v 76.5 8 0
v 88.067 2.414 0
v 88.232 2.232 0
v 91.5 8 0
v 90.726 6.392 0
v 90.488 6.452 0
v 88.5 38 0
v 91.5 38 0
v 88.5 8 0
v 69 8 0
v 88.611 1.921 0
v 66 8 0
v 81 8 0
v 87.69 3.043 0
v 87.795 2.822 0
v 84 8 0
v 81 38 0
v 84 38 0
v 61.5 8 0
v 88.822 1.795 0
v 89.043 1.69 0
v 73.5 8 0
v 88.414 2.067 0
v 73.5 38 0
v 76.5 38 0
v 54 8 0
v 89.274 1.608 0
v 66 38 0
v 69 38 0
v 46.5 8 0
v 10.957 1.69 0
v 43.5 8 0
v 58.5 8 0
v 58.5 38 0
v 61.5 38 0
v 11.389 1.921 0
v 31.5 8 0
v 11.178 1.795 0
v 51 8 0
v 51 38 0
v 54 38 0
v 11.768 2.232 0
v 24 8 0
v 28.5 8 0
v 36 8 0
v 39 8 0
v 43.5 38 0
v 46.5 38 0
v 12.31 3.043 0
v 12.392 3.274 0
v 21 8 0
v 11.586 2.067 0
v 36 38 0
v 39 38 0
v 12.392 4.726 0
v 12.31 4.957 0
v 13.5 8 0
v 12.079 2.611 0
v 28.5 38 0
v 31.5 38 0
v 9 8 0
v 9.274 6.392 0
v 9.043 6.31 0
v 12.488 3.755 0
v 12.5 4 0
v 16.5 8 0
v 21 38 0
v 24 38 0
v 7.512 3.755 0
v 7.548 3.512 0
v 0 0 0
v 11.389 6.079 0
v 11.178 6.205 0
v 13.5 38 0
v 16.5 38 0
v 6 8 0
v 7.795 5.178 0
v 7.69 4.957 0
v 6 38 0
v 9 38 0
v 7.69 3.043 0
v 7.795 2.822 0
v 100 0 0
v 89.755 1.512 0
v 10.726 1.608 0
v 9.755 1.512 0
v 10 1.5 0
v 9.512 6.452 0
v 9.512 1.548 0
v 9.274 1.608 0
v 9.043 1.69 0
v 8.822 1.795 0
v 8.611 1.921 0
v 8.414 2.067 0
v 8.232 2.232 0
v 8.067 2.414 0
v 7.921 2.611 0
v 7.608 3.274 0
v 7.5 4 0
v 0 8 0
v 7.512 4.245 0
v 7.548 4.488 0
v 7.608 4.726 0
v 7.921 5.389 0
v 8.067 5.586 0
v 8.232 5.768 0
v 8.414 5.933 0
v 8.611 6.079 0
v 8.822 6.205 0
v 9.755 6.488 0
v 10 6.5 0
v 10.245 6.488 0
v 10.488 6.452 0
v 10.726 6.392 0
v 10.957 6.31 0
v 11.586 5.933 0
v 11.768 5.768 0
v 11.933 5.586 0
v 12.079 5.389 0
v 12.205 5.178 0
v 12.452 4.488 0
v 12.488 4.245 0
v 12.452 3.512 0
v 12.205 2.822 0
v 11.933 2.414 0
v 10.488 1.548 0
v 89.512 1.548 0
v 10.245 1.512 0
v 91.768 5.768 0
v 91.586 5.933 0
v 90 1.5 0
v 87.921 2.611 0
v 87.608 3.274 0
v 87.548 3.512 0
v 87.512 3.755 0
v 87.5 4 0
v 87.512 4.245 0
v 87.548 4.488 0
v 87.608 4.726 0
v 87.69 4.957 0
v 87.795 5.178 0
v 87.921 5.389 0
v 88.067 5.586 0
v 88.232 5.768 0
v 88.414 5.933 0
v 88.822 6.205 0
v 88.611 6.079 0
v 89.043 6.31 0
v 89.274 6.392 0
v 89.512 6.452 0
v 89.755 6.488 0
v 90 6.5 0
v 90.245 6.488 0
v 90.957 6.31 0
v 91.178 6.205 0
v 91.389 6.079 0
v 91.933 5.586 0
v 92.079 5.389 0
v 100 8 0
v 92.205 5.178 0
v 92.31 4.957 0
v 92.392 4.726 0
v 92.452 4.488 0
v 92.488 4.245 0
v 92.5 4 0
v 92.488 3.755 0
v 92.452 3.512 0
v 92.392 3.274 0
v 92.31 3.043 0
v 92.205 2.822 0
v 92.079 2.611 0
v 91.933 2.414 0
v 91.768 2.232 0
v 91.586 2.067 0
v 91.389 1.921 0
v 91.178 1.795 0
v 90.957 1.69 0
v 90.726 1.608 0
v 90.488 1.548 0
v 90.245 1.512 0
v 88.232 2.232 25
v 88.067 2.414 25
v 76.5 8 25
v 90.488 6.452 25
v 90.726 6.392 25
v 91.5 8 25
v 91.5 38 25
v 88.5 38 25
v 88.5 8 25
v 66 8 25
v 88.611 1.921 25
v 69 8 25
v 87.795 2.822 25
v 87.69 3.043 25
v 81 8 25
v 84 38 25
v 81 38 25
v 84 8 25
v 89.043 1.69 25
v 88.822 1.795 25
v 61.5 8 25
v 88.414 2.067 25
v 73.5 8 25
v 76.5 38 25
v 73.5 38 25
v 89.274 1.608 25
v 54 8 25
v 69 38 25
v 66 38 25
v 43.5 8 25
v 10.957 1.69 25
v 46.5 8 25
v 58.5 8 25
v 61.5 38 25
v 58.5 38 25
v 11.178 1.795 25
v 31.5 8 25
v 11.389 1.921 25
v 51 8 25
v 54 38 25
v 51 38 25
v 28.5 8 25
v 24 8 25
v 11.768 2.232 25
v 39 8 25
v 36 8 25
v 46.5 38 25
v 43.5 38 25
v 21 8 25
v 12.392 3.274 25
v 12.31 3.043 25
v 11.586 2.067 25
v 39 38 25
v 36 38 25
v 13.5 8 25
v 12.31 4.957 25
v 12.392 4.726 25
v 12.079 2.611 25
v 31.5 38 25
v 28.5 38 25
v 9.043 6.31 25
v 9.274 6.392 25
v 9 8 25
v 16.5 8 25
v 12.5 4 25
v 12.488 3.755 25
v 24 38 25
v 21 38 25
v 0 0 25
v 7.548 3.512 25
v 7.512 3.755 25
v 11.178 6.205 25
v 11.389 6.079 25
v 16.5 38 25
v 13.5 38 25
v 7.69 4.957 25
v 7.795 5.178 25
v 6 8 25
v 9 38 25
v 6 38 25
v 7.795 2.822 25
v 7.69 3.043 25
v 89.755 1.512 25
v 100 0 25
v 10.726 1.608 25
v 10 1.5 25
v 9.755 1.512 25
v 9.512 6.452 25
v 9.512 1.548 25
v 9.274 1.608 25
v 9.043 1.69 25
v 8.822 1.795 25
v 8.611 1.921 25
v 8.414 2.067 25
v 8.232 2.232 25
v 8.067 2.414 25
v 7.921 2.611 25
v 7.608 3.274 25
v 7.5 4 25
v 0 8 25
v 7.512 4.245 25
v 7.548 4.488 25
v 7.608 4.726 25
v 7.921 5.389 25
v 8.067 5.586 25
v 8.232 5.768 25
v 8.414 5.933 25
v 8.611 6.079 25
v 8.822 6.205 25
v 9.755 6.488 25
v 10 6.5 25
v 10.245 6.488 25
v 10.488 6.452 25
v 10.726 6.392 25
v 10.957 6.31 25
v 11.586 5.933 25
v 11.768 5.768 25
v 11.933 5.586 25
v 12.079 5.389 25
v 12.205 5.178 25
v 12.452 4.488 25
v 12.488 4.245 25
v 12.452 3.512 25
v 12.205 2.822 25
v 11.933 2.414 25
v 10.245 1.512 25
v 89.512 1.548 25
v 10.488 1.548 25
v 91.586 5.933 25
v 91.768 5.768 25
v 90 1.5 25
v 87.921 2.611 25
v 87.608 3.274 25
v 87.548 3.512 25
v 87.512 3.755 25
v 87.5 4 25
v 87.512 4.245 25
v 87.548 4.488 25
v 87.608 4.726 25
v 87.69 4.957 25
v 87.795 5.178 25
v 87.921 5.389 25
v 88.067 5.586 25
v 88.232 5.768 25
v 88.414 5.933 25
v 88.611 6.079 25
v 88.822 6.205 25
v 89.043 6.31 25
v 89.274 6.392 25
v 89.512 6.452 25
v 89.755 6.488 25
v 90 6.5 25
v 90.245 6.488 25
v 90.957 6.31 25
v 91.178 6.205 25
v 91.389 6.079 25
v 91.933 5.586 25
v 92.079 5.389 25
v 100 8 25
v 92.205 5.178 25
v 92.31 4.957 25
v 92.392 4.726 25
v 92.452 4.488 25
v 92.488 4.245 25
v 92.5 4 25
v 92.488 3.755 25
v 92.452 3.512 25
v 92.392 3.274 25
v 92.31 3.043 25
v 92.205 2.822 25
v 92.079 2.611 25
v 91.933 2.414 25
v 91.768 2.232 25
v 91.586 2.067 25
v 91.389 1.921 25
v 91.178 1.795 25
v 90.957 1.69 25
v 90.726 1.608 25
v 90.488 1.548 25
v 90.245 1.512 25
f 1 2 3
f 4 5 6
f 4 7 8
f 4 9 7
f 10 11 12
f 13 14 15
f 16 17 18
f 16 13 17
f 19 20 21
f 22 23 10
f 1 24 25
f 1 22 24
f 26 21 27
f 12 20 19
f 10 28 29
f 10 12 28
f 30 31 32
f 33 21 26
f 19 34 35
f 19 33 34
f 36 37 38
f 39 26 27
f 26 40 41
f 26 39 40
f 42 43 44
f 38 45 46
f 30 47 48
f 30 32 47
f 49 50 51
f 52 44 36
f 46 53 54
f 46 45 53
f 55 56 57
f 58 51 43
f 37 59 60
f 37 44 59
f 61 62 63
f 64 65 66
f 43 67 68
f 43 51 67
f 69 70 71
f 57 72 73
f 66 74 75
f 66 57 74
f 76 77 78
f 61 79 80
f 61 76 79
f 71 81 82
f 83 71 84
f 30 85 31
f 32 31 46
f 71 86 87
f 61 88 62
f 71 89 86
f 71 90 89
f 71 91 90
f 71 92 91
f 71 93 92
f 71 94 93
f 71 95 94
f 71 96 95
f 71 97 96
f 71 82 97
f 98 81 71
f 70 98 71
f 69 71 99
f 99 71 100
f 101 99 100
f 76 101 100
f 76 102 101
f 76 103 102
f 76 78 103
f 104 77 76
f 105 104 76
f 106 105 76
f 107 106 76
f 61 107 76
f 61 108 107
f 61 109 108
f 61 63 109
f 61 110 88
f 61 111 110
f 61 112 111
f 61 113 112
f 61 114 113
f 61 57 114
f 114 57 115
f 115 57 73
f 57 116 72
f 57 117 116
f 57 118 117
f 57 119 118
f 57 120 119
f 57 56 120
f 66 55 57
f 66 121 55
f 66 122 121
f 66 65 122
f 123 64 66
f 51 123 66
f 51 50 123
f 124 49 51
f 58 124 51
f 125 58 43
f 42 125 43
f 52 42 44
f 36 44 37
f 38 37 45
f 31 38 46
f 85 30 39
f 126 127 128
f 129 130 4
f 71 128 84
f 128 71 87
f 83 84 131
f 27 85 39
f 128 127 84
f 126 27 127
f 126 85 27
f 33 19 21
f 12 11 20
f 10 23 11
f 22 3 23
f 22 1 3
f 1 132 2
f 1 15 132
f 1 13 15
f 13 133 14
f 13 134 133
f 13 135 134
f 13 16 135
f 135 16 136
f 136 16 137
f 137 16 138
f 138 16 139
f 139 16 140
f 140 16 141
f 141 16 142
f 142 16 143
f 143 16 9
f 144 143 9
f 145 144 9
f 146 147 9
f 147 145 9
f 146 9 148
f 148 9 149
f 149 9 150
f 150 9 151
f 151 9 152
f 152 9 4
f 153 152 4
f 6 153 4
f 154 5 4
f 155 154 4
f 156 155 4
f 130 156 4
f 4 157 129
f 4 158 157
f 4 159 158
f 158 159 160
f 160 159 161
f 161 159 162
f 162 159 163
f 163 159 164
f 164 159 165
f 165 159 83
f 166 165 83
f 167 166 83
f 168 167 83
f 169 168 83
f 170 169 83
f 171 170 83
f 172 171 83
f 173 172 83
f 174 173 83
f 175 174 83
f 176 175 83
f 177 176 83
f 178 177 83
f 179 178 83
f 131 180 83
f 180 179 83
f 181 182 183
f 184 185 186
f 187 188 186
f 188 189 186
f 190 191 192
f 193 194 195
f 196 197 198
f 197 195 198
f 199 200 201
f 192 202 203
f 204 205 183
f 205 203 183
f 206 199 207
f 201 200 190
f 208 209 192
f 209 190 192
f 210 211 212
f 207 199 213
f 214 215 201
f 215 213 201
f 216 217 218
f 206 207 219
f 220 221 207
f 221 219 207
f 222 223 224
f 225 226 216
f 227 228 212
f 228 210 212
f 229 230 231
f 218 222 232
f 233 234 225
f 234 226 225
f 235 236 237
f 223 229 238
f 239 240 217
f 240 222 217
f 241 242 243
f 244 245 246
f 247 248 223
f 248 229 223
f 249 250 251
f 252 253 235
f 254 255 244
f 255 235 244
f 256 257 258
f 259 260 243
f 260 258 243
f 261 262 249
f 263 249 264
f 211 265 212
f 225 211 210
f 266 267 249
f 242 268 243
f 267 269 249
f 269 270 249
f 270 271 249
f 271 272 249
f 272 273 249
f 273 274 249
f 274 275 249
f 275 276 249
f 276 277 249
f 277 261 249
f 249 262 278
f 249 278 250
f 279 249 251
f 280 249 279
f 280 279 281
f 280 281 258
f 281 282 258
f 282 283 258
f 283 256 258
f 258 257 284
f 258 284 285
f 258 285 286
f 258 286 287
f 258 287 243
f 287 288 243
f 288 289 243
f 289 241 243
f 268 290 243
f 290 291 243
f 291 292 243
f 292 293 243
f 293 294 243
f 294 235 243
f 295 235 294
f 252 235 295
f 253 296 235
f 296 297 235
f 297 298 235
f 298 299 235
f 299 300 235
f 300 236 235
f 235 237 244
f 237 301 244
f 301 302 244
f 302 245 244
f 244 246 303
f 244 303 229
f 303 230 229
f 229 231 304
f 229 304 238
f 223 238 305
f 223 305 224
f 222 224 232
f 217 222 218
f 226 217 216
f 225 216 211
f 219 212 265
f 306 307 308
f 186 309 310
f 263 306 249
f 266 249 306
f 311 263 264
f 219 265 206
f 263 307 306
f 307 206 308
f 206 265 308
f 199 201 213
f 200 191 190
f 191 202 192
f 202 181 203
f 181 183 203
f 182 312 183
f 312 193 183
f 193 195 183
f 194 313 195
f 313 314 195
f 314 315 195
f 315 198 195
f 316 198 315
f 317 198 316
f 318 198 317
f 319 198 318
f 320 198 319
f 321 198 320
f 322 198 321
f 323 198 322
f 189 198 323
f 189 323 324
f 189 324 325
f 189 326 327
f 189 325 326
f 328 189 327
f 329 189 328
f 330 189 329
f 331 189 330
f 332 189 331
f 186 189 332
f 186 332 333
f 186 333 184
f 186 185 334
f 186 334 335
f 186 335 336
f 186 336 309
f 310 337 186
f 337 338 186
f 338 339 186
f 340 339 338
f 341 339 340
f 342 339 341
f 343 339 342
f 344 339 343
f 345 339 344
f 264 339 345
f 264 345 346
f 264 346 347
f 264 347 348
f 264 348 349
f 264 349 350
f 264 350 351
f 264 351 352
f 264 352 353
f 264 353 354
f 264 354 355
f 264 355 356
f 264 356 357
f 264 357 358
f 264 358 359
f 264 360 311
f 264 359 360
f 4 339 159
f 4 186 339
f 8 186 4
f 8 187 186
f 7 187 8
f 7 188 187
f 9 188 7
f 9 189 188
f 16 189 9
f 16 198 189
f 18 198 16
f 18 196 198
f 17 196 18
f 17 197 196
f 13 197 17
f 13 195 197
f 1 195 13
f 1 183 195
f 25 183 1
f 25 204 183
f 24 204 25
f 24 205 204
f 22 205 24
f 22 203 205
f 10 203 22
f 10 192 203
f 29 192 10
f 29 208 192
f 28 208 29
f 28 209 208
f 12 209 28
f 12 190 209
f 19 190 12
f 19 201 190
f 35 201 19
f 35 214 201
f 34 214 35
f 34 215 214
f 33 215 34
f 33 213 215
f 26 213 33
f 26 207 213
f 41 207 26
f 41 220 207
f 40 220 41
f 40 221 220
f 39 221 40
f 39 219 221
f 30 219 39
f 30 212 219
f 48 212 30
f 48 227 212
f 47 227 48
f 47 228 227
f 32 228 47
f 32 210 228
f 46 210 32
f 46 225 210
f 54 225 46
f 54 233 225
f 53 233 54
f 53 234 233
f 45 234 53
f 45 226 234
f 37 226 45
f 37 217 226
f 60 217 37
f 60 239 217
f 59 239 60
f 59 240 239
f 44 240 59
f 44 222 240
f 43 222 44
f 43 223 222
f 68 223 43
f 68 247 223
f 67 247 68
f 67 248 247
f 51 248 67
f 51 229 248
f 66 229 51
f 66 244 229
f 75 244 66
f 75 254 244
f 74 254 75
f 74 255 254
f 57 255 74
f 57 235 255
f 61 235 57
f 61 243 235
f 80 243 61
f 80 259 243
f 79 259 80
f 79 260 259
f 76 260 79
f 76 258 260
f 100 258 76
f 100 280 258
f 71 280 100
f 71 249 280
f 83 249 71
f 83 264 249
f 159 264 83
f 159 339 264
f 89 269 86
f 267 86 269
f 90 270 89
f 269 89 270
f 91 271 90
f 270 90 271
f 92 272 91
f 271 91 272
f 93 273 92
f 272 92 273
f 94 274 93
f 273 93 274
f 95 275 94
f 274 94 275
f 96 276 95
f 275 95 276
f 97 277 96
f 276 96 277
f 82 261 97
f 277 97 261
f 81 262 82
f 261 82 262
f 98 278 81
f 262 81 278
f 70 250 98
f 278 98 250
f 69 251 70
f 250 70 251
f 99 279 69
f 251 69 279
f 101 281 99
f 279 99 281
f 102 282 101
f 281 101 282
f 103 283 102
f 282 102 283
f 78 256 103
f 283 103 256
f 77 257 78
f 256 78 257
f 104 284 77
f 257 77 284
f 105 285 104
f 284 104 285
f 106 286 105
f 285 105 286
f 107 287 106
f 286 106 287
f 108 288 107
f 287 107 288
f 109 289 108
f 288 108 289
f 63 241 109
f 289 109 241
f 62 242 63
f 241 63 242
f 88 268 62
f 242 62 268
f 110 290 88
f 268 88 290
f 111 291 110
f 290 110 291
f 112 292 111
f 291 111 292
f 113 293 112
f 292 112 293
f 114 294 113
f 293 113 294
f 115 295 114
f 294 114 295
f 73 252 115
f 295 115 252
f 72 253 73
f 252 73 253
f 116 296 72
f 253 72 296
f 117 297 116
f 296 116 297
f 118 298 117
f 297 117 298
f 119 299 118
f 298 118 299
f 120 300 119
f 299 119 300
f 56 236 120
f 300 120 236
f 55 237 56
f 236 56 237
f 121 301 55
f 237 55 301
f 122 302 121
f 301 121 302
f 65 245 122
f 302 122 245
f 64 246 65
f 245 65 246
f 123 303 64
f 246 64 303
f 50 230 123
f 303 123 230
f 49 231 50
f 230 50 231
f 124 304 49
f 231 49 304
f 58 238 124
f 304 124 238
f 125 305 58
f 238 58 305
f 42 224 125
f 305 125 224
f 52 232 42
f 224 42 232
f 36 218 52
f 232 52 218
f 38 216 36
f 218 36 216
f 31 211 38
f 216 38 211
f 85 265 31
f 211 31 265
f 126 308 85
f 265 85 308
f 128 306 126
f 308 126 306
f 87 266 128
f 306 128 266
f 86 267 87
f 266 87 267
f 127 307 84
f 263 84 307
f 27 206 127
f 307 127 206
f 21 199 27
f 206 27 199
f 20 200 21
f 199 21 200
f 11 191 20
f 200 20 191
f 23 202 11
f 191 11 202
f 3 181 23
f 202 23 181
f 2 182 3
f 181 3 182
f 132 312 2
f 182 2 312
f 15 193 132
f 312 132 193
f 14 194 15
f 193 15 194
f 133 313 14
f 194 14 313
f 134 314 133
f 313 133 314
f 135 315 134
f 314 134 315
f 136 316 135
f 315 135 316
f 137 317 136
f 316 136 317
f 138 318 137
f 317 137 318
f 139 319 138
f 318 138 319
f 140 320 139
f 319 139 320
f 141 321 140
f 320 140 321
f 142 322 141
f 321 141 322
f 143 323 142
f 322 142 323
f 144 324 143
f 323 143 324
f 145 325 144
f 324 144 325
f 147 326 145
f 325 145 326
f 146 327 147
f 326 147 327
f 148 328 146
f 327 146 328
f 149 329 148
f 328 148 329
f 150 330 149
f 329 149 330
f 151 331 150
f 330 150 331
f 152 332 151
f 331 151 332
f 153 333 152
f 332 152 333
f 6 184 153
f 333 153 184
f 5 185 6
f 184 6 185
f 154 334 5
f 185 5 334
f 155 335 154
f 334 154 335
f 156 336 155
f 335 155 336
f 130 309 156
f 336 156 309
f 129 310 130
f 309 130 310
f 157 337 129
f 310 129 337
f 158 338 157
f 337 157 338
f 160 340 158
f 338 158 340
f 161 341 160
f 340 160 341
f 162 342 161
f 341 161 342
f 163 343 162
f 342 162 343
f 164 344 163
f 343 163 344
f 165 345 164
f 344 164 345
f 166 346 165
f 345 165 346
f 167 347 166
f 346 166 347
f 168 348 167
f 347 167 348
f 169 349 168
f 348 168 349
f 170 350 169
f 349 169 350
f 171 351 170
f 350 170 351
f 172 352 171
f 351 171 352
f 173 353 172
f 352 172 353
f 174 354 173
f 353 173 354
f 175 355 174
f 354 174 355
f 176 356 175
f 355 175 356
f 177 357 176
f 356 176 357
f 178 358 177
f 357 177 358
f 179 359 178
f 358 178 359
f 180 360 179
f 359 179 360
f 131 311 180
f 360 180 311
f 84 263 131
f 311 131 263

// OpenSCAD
linear_extrude(height = 25)
  difference() {
    polygon(points = [[0,0],[100,0],[100,8],[91.5,8],[91.5,38],[88.5,38],[88.5,8],[84,8],[84,38],[81,38],[81,8],[76.5,8],[76.5,38],[73.5,38],[73.5,8],[69,8],[69,38],[66,38],[66,8],[61.5,8],[61.5,38],[58.5,38],[58.5,8],[54,8],[54,38],[51,38],[51,8],[46.5,8],[46.5,38],[43.5,38],[43.5,8],[39,8],[39,38],[36,38],[36,8],[31.5,8],[31.5,38],[28.5,38],[28.5,8],[24,8],[24,38],[21,38],[21,8],[16.5,8],[16.5,38],[13.5,38],[13.5,8],[9,8],[9,38],[6,38],[6,8],[0,8]], paths = [[0,1,2,3,4,5,6,7,8,9,10,11,12,13,14,15,16,17,18,19,20,21,22,23,24,25,26,27,28,29,30,31,32,33,34,35,36,37,38,39,40,41,42,43,44,45,46,47,48,49,50,51,52,53,54,55,56,57,58,59,60,61,62,63,64,65,66,67,68,69,70,71,72,73,74,75,76,77,78,79,80,81,82,83,84,85,86,87,88,89,90,91,92,93,94,95,96,97,98,99,100]]);
    translate([10,4]) circle(r = 2.5, $fn = 64);
    translate([90,4]) circle(r = 2.5, $fn = 64);
  }
